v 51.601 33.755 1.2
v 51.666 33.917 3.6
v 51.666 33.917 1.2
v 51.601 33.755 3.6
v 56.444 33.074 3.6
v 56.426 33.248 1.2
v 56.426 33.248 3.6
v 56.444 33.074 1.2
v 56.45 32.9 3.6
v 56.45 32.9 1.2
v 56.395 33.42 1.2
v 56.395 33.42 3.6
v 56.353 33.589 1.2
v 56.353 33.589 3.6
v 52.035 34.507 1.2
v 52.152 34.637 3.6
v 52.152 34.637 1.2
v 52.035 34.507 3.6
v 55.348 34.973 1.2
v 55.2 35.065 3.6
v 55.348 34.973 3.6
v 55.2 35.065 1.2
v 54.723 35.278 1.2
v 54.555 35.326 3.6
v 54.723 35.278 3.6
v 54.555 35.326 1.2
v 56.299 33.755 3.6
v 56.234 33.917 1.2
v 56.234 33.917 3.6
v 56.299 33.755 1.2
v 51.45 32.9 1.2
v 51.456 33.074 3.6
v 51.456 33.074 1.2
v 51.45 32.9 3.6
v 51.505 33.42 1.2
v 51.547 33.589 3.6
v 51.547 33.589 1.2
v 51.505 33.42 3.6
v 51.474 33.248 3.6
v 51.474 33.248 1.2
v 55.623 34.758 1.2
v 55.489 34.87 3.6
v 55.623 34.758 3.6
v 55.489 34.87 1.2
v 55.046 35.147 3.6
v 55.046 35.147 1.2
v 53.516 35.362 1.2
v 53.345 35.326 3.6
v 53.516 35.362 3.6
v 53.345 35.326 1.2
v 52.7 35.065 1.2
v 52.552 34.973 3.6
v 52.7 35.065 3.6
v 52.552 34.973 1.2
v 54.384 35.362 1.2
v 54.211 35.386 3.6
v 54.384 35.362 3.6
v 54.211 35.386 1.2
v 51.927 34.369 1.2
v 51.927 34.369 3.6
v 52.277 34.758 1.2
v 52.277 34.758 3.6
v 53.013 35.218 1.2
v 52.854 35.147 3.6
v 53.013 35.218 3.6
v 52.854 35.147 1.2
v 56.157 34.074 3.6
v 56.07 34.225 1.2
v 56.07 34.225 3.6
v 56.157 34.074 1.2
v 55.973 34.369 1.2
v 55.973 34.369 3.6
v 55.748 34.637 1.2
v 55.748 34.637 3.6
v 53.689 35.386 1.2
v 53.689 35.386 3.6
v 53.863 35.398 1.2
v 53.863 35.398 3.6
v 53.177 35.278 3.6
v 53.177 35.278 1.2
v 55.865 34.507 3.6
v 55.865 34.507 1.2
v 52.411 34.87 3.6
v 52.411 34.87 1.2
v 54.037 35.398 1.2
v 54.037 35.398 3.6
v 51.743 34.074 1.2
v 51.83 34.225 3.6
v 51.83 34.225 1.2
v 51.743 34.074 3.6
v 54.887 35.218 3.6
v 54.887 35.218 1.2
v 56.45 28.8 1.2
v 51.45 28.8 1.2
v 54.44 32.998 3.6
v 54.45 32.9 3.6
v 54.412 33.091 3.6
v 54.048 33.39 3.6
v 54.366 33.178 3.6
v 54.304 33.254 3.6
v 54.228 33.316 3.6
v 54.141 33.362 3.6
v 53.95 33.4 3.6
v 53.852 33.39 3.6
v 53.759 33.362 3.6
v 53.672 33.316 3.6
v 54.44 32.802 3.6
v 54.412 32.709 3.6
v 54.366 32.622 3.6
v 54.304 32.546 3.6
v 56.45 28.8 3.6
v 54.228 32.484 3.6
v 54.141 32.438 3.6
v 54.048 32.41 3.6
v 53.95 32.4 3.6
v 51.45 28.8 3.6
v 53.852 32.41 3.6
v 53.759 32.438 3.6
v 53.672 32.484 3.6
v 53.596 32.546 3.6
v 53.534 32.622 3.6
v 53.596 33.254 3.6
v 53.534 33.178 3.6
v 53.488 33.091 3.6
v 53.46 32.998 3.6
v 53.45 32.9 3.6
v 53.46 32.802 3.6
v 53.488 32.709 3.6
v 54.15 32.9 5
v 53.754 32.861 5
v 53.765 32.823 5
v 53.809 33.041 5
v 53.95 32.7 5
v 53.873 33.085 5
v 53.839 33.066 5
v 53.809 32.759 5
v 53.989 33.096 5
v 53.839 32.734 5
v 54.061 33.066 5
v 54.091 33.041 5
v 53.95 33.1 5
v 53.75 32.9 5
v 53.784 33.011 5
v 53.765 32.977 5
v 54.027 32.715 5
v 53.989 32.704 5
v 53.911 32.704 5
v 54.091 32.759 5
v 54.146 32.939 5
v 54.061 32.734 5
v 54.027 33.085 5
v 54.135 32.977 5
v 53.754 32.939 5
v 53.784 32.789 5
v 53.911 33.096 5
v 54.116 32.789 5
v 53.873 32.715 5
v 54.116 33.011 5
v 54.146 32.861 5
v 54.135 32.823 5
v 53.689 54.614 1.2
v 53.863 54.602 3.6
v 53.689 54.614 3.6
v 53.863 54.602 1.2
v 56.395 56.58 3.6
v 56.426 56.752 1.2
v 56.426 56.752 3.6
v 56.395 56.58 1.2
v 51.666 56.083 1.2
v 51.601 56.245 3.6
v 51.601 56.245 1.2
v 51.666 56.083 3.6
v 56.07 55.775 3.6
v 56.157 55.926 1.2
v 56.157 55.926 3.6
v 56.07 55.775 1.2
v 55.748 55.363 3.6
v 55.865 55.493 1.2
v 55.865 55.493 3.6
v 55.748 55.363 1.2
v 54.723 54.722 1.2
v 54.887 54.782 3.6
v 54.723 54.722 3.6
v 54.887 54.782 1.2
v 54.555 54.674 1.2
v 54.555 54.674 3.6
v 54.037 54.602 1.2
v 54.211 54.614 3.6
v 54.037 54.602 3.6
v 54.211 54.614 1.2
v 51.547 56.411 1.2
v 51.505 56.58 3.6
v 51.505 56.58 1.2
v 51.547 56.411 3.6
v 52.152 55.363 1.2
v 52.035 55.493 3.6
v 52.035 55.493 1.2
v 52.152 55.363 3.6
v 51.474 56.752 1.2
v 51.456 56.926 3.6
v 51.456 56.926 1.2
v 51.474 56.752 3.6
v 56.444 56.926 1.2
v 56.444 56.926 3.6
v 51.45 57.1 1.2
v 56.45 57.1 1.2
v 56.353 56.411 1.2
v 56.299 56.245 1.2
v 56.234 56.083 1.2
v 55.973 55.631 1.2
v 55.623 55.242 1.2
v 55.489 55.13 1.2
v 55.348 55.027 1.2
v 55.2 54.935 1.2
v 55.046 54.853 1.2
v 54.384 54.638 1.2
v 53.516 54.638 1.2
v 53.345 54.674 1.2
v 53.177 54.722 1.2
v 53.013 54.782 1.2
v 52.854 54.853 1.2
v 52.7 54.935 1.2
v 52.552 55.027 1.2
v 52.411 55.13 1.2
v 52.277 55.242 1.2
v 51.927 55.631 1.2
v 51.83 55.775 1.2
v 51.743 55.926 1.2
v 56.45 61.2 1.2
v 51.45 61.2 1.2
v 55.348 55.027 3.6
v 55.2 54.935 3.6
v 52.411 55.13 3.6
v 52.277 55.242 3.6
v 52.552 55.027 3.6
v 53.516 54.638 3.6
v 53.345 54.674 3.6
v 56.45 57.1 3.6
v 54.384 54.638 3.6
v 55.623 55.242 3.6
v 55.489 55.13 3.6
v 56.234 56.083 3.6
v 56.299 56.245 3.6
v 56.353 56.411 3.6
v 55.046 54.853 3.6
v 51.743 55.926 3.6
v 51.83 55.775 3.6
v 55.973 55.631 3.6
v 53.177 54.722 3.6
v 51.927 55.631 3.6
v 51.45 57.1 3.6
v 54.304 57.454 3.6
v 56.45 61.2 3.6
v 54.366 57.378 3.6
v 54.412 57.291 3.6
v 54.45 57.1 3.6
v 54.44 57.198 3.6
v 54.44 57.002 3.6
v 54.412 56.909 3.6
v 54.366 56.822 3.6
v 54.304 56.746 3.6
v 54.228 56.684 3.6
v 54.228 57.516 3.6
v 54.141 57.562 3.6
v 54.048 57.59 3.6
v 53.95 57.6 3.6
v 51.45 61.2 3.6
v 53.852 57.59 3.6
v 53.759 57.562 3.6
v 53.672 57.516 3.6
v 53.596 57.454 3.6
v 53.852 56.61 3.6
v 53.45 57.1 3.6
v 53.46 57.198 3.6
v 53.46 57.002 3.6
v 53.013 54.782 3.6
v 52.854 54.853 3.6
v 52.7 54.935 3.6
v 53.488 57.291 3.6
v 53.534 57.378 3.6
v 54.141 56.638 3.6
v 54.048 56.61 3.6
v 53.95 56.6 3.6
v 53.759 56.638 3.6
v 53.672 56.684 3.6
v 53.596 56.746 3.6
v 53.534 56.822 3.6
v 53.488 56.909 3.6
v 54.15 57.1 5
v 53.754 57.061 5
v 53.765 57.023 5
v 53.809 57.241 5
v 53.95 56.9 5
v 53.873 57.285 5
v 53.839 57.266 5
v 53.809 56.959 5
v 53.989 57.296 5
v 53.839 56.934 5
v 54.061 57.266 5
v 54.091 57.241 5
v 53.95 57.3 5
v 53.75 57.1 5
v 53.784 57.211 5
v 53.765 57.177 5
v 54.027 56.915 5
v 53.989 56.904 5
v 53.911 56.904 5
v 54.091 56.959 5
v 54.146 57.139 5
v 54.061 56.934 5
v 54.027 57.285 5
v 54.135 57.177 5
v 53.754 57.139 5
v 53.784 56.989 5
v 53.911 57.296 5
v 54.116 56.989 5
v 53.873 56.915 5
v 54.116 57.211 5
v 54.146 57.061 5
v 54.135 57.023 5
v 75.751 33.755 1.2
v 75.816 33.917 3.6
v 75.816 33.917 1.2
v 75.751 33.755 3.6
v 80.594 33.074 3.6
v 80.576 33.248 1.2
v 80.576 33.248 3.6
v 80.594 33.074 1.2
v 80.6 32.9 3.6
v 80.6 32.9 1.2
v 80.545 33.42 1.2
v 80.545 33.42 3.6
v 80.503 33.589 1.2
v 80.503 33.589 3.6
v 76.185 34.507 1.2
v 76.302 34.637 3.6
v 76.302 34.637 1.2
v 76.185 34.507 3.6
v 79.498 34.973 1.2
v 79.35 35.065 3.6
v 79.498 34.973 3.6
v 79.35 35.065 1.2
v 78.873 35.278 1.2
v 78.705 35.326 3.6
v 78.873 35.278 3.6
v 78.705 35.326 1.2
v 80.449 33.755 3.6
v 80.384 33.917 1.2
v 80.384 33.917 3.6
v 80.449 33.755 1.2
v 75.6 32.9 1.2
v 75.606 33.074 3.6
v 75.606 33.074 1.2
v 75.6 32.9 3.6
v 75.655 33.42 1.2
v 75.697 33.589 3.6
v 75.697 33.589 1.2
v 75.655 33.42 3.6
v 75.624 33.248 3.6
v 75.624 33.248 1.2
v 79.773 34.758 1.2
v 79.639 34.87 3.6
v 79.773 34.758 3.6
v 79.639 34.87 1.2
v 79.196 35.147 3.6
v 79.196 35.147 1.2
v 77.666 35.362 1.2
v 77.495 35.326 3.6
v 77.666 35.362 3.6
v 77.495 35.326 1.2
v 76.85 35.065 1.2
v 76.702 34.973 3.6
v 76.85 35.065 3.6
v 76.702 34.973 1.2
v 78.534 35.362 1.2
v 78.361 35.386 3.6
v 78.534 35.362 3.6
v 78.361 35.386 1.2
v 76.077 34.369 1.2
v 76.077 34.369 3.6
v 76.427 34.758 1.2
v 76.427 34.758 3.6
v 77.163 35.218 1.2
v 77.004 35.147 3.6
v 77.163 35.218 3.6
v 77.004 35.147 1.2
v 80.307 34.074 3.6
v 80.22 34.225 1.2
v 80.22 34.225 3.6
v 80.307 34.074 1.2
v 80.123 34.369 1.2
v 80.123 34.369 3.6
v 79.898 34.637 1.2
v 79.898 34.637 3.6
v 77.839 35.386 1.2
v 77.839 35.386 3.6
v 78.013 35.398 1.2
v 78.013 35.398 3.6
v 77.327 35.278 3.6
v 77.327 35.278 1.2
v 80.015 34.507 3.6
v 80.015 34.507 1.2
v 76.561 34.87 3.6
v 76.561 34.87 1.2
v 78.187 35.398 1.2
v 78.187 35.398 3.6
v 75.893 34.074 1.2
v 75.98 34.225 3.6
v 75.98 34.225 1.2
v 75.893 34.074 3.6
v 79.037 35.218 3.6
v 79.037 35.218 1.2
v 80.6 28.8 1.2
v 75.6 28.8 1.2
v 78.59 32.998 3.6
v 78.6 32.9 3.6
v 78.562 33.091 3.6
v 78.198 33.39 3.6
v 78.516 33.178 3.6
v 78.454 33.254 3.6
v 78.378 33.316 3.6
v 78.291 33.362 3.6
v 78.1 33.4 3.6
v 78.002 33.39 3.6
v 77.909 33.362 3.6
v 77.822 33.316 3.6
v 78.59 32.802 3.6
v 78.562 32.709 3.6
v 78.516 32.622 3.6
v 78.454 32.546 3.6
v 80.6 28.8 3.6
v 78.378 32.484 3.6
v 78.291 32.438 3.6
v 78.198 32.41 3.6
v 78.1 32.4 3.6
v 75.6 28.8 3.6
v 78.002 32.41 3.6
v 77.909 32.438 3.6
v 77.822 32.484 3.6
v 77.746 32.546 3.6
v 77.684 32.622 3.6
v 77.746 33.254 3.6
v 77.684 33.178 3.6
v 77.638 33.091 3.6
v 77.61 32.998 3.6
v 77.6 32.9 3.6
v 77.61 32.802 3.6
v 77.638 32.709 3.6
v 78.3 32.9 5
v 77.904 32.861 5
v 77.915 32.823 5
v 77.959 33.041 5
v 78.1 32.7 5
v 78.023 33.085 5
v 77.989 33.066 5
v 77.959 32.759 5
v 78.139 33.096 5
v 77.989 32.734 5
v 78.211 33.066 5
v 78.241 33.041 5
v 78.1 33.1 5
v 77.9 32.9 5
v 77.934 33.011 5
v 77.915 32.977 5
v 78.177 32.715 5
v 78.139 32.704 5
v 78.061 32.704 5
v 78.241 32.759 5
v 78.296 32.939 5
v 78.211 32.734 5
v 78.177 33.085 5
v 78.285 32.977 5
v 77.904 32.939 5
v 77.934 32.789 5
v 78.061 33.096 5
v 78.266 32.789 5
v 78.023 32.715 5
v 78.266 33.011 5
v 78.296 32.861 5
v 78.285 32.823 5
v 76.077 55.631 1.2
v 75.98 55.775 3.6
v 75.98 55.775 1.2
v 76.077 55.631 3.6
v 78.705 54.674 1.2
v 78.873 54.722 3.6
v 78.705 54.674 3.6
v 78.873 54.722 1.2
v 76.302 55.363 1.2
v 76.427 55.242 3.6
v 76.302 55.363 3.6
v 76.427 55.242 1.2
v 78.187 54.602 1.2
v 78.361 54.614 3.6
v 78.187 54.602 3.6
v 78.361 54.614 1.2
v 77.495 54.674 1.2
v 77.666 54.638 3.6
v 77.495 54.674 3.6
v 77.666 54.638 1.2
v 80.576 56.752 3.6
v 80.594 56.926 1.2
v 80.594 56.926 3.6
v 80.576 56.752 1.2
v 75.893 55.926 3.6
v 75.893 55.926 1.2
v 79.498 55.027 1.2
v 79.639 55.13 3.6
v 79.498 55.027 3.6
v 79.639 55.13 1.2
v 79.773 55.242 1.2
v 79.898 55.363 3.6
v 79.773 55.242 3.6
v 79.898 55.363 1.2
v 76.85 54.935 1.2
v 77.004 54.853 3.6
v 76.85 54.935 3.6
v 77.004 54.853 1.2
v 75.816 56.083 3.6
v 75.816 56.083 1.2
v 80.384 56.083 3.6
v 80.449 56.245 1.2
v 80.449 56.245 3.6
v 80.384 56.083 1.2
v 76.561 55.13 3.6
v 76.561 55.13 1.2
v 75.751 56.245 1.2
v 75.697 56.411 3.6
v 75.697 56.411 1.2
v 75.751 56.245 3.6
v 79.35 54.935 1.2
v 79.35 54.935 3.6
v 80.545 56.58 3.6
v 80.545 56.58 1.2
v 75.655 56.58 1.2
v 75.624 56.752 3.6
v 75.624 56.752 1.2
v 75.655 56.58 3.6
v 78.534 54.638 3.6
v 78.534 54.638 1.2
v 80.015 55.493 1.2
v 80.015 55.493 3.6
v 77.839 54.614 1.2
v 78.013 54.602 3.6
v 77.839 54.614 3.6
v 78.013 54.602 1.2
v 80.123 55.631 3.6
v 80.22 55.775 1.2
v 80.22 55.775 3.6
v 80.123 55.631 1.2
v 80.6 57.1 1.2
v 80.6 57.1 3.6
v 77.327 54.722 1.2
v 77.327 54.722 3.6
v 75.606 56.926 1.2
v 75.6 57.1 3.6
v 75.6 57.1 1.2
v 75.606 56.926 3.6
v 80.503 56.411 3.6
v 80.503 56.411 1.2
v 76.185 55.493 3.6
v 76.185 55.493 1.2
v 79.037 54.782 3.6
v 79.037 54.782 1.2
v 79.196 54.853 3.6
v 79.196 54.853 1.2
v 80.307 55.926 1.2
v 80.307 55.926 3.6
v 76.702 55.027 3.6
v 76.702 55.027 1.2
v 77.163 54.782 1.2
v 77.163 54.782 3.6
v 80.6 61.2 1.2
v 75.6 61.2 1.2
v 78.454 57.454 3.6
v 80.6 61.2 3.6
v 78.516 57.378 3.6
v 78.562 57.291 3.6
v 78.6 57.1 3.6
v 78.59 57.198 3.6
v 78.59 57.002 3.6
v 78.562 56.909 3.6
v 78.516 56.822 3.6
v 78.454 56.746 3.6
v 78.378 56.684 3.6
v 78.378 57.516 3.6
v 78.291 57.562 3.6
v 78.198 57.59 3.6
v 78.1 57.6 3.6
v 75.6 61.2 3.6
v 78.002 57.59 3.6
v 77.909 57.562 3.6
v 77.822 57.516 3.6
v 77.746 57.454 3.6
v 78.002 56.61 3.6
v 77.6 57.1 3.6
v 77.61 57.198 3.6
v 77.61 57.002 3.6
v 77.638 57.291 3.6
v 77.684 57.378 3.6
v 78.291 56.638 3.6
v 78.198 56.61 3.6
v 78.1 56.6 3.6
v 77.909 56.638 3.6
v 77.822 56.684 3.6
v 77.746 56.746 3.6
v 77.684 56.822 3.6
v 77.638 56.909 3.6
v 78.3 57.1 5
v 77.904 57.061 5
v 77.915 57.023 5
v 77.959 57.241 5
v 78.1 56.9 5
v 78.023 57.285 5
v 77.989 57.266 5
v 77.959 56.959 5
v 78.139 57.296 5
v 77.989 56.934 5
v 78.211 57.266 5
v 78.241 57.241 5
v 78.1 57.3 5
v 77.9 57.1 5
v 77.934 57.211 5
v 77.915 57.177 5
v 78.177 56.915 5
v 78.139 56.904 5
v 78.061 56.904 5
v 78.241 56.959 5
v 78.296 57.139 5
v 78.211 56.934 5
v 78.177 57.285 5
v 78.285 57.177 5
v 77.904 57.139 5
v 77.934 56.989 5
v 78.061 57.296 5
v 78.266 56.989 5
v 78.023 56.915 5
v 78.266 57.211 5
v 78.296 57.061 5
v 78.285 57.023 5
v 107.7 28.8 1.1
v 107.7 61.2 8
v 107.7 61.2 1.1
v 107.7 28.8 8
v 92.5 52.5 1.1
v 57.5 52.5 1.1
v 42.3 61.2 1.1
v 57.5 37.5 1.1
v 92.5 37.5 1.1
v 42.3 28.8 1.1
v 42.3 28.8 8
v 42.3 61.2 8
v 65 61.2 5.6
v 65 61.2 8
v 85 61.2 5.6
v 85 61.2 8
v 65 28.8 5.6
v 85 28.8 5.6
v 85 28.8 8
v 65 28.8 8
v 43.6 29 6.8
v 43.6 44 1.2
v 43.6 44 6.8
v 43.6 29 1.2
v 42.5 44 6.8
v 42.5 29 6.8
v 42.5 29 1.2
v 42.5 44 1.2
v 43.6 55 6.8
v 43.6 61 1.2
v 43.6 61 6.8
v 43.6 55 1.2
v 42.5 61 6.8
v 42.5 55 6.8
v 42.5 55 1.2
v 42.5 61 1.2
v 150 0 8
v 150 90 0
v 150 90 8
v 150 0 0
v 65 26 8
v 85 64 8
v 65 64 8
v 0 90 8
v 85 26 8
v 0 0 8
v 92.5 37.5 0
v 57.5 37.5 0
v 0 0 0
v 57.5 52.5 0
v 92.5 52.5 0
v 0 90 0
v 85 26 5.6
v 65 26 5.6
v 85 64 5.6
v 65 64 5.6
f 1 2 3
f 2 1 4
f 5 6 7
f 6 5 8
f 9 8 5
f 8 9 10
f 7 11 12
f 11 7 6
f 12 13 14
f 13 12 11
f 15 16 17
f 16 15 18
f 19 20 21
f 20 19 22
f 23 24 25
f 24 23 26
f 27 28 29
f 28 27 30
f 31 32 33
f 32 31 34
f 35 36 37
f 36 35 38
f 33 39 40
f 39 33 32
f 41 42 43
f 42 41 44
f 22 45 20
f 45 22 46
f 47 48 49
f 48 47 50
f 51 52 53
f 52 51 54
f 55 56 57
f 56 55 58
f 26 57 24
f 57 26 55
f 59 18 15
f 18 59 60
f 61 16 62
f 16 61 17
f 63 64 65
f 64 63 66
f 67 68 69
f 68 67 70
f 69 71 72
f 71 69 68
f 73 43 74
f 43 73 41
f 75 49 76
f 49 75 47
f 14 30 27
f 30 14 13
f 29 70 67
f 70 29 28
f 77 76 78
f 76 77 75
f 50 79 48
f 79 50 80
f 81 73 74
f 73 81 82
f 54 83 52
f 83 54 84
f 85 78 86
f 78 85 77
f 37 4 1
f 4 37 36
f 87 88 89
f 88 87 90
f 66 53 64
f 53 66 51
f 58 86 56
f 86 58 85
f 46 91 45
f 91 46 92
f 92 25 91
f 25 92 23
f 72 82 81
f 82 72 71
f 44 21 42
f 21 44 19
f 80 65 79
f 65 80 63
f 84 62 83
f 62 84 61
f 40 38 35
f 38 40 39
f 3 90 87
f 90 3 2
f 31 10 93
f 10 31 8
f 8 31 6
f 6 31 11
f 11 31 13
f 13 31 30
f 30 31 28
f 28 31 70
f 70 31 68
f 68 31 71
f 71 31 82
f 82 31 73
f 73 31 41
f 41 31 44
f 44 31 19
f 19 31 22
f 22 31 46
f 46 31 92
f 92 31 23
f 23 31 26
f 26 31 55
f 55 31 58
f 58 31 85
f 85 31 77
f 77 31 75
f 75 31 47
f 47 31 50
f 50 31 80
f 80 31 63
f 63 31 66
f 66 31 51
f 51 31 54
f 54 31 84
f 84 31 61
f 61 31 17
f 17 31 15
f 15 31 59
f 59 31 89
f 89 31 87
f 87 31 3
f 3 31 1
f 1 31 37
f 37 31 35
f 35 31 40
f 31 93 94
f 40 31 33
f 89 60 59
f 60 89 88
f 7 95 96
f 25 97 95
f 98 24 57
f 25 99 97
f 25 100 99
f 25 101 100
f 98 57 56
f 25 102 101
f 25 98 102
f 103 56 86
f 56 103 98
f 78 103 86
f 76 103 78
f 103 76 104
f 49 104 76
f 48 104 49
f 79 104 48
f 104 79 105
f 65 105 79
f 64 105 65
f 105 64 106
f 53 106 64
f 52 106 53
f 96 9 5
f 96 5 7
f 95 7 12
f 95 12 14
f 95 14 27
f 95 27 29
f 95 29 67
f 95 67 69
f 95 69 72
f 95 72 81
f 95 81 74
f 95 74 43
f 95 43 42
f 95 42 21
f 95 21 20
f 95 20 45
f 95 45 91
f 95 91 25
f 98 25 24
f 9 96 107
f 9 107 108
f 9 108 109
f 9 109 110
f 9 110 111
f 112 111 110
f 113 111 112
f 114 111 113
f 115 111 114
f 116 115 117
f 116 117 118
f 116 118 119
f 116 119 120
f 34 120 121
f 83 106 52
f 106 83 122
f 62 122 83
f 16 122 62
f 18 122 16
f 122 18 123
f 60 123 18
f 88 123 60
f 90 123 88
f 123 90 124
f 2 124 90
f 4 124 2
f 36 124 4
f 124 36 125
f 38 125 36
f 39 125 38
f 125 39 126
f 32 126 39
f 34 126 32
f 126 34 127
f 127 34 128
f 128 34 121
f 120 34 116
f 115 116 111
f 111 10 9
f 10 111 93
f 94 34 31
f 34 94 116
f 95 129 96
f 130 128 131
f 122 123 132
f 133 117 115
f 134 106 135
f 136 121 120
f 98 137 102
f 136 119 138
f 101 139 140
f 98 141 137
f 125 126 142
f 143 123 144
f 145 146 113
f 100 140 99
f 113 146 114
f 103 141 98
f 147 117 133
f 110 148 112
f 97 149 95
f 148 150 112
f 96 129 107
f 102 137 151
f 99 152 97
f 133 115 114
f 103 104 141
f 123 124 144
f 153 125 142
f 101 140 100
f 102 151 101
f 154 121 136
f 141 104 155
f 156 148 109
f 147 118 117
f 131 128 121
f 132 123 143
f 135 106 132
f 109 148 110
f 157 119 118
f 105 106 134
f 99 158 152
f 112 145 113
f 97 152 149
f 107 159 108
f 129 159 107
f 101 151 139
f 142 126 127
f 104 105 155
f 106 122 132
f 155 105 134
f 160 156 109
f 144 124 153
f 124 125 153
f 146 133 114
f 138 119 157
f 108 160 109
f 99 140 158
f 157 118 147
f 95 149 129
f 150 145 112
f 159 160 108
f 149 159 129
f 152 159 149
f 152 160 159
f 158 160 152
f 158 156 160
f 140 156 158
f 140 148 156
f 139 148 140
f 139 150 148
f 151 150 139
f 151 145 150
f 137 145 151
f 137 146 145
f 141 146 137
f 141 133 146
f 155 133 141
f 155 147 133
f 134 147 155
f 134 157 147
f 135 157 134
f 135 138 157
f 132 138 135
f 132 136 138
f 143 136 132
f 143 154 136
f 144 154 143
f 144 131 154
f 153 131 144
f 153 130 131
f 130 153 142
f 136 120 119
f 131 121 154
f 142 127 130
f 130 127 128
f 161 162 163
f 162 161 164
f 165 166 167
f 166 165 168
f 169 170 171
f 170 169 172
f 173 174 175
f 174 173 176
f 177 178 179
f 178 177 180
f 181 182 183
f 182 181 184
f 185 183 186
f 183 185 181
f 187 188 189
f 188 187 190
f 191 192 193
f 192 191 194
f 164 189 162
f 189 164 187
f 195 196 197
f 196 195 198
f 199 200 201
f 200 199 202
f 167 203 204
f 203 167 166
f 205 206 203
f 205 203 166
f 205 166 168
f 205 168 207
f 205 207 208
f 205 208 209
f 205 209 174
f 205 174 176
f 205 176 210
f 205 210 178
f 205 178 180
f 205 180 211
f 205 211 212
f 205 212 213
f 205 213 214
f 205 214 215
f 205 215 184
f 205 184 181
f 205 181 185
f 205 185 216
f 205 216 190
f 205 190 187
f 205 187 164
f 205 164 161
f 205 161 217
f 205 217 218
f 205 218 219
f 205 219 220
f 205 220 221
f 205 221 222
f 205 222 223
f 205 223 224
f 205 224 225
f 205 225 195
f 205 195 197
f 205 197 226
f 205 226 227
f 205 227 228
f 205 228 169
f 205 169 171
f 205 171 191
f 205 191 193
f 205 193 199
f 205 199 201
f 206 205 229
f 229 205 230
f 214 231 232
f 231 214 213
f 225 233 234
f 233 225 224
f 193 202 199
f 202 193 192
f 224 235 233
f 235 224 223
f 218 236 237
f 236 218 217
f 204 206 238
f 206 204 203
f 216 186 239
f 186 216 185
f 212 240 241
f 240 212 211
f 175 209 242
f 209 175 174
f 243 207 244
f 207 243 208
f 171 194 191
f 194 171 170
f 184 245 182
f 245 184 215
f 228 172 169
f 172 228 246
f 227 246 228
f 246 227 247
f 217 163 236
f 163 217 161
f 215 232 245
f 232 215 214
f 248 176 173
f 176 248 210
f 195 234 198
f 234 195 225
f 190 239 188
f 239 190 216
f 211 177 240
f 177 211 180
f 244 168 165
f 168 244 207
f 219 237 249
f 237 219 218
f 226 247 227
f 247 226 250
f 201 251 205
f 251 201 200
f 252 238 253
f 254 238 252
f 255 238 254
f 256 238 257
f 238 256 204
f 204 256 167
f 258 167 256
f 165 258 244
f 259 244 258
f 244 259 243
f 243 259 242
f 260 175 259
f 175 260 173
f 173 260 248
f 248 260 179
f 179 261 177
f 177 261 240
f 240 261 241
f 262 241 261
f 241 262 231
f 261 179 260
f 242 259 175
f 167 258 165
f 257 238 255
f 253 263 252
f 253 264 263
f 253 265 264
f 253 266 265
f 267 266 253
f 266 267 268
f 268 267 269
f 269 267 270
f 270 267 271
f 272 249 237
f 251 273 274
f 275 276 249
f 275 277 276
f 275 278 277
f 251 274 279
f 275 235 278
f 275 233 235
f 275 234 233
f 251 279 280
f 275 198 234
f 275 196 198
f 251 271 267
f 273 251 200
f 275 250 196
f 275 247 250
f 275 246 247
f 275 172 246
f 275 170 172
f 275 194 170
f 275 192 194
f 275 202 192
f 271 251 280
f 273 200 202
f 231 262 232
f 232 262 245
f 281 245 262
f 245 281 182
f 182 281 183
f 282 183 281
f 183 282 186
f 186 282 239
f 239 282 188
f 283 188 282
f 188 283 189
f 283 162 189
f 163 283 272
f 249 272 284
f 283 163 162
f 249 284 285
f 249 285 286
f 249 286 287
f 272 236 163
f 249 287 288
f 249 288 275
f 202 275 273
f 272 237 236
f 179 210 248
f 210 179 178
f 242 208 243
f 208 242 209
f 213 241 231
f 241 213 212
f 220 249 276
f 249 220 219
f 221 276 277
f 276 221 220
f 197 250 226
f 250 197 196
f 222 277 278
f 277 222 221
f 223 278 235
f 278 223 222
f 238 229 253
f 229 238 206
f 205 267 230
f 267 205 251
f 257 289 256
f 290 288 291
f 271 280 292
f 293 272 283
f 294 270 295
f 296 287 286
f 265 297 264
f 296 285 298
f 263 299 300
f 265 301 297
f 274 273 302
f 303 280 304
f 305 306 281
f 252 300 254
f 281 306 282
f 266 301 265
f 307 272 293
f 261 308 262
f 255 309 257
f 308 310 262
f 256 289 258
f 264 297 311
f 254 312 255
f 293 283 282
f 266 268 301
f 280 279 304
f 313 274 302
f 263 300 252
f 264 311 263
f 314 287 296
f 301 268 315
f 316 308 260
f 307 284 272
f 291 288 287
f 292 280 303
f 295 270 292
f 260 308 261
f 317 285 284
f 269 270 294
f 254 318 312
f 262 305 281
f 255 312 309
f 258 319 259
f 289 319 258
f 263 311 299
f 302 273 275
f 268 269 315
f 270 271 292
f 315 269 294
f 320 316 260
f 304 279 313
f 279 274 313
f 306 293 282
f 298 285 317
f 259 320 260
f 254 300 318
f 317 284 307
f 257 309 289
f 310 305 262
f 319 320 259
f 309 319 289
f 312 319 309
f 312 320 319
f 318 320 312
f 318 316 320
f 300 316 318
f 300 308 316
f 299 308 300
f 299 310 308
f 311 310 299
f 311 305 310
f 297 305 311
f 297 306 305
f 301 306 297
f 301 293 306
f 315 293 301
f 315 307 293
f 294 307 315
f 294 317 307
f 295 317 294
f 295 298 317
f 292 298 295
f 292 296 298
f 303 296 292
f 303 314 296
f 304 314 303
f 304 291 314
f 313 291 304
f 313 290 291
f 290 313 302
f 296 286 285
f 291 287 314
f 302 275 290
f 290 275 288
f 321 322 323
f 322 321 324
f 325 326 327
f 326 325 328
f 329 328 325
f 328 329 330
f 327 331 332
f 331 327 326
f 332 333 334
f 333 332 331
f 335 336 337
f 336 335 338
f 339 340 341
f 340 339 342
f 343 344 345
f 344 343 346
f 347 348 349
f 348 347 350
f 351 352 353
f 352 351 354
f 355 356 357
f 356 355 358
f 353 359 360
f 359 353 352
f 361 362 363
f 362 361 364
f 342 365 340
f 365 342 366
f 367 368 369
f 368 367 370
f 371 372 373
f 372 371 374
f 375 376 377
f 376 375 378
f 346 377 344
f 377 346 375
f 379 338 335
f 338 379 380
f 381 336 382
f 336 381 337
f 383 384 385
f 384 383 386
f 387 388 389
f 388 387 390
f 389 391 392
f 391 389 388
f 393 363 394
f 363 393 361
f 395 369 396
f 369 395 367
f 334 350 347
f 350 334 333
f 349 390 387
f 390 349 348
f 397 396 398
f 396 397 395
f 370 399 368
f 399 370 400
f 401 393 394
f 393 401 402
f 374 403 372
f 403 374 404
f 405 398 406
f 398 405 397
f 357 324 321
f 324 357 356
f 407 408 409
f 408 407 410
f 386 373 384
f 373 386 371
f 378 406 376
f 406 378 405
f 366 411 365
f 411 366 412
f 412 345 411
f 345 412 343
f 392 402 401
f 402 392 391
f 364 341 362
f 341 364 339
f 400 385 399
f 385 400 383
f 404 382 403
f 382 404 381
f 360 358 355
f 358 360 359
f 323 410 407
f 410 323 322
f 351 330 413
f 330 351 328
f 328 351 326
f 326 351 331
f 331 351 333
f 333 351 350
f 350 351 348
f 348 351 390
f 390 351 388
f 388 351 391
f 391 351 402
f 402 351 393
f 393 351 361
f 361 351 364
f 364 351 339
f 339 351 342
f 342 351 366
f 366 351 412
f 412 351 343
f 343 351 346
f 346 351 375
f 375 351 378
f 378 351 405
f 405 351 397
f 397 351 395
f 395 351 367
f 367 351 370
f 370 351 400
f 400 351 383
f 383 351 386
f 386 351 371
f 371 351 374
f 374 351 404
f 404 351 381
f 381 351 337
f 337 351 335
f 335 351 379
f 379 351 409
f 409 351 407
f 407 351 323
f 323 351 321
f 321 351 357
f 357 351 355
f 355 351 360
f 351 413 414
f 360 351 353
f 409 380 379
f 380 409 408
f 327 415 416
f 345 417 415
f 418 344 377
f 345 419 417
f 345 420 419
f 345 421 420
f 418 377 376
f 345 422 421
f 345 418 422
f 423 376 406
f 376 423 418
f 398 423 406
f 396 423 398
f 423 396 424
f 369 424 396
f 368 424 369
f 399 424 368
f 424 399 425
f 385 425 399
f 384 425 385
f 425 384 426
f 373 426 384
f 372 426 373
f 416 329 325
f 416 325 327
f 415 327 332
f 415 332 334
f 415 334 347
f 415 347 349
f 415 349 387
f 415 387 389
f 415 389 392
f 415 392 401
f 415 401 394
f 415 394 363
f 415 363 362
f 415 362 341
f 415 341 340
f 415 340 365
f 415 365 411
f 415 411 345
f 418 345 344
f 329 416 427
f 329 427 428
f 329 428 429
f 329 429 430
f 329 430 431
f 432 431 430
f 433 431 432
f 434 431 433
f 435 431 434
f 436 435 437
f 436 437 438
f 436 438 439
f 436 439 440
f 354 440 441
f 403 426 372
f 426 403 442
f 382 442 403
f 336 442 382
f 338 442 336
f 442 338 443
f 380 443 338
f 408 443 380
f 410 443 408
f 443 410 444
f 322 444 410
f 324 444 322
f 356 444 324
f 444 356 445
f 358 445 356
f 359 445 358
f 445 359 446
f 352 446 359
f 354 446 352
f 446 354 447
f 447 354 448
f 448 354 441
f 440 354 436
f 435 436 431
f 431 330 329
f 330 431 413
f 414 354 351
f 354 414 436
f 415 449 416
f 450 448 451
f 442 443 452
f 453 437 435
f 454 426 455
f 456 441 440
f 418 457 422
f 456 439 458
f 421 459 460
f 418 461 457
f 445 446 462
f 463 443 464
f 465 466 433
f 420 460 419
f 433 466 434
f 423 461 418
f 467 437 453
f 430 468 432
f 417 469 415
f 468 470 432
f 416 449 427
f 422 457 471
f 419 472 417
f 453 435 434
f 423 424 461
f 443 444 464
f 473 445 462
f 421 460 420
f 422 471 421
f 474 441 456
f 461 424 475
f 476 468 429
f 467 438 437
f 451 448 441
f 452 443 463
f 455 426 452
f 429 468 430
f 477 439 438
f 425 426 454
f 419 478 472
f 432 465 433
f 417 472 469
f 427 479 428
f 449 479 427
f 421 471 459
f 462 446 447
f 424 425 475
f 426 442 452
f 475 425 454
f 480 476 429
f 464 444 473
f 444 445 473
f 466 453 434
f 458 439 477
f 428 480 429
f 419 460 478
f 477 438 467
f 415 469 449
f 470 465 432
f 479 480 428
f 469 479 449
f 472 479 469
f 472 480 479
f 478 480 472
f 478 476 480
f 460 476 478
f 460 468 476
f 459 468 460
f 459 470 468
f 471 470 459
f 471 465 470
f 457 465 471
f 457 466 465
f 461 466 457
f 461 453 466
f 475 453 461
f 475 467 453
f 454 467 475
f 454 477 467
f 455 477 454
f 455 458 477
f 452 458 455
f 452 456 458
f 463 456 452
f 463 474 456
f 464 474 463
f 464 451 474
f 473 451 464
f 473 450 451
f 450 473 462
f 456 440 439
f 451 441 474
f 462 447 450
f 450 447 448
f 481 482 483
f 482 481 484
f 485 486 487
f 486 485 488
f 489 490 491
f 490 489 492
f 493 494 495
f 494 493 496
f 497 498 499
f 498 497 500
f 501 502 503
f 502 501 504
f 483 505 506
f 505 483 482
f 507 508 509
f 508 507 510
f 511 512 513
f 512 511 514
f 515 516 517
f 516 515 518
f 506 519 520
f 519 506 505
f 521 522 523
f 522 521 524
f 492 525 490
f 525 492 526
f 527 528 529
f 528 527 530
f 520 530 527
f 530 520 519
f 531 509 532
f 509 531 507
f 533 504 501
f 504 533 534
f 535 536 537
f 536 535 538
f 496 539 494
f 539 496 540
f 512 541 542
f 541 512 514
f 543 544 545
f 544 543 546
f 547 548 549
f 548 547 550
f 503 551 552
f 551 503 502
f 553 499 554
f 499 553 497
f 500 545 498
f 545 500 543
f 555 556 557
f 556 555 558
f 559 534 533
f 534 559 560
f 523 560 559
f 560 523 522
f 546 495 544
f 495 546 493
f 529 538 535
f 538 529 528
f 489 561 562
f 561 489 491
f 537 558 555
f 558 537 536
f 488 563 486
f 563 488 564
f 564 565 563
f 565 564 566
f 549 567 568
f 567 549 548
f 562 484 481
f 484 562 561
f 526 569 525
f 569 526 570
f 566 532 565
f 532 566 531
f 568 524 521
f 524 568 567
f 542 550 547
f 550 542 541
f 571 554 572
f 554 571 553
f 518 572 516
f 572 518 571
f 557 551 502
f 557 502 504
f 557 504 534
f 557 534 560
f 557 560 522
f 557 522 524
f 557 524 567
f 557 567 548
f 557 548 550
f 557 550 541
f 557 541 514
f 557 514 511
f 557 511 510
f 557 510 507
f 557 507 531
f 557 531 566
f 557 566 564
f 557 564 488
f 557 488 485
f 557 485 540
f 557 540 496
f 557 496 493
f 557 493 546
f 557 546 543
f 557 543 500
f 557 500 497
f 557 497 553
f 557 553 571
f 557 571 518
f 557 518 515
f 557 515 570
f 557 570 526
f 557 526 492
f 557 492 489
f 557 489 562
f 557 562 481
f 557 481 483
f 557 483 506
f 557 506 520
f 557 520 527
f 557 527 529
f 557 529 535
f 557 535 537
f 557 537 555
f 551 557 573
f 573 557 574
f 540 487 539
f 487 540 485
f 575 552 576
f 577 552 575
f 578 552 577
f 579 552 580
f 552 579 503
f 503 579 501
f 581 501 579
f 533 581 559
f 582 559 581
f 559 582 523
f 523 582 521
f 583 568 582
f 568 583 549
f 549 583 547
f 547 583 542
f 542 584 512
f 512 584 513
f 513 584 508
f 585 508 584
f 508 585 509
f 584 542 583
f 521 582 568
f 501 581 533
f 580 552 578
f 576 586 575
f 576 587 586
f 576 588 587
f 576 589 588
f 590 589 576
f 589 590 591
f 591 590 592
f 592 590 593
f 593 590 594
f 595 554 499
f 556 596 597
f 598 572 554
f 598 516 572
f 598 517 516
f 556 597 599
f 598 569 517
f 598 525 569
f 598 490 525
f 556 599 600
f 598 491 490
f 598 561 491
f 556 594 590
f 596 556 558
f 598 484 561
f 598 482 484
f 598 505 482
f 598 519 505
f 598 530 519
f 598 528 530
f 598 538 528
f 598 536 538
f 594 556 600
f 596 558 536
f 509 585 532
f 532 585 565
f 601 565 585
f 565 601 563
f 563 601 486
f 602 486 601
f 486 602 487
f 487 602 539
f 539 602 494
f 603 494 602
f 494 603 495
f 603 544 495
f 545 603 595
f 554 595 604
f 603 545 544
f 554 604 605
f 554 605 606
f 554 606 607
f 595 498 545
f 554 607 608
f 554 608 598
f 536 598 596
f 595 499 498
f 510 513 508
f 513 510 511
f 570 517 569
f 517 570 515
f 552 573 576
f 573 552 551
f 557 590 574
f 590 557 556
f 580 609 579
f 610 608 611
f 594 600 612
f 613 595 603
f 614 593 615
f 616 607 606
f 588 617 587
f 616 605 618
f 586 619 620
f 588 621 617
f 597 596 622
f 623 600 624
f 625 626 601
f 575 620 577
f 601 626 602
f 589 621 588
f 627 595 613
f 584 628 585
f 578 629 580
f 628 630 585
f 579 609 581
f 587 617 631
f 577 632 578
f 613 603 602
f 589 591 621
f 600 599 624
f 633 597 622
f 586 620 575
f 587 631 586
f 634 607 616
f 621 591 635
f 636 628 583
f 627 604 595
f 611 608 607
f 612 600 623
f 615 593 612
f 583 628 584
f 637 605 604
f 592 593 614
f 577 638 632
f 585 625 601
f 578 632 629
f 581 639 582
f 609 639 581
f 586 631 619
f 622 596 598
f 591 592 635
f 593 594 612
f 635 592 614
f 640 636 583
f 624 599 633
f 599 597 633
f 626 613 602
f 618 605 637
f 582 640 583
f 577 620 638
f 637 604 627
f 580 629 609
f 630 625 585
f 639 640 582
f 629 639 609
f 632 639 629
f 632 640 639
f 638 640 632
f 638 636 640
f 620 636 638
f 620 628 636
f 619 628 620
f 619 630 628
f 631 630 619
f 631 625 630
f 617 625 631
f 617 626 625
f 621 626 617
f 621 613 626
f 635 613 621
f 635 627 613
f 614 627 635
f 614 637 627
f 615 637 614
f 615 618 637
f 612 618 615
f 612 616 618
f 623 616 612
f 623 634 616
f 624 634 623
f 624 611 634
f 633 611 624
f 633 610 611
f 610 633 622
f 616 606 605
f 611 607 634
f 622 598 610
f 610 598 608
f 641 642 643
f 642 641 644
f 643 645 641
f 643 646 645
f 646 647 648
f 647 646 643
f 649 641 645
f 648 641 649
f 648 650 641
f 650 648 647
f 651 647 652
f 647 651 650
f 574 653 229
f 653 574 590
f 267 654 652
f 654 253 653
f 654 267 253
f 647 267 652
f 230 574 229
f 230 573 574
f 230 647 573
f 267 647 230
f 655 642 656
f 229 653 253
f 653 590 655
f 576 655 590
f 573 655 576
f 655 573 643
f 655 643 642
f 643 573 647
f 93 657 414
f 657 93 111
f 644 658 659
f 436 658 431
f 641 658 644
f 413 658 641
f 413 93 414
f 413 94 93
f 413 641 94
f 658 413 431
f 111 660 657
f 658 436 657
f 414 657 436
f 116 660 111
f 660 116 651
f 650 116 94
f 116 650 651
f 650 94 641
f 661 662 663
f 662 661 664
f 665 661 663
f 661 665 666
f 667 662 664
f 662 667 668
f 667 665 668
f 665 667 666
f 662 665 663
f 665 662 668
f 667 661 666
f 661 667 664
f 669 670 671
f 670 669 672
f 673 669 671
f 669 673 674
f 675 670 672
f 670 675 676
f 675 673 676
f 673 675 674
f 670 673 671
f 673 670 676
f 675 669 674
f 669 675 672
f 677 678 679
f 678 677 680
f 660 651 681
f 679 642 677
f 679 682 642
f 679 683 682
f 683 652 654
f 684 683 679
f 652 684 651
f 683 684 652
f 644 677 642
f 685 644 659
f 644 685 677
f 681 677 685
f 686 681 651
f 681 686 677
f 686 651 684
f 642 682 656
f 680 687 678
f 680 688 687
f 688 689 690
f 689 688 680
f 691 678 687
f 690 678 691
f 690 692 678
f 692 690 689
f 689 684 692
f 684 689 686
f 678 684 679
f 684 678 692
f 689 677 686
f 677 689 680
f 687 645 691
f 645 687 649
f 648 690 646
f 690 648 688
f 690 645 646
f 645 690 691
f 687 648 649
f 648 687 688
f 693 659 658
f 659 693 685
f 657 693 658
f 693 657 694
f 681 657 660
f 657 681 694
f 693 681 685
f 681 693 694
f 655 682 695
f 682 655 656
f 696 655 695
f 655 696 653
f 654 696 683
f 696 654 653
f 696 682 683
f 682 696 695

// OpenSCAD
$fs=0.1; 
$fa=4;

difference() {
    cube([150, 90, 5.6 + 1.2 + 1.2]);
    translate([150/2 - 65/2, 90/2 - 32/2, 1.2]) {
        difference() {
            translate([-0.2, -0.2, -0.1])
                cube([65.4, 32.4, 5.6 + 1.2 + 0.2]);

            translate([11.45, 3.9, 0]) {
                cylinder(h=2.4, r=2.5);
                translate([-2.5, -5, 0])
                    cube([5, 5, 2.4]);
                translate([0,0,2.4])
                    cylinder(h=1.4, r1=0.5, r2=0.2);
            }
            
            translate([11.45, 28.10, 0]) {
                cylinder(h=2.4, r=2.5);
                translate([-2.5, 0, 0])
                    cube([5, 5, 2.4]);
                translate([0,0,2.4])
                    cylinder(h=1.4, r1=0.5, r2=0.2);
            }
            
            translate([35.6, 3.9, 0]) {
                cylinder(h=2.4, r=2.5);
                translate([-2.5, -5, 0])
                    cube([5, 5, 2.4]);
                translate([0,0,2.4])
                    cylinder(h=1.4, r1=0.5, r2=0.2);
            }
            
            translate([35.6, 28.10, 0]) {
                cylinder(h=2.4, r=2.5);
                translate([-2.5, 0, 0])
                    cube([5, 5, 2.4]);
                translate([0,0,2.4])
                    cylinder(h=1.4, r1=0.5, r2=0.2);
            }
            
            translate([0, 0, 0])
                cube([1.1, 15, 5.6]);
            
            translate([0, 32 - 6, 0])
                cube([1.1, 6, 5.6]);
        }
    }
    
    translate([150/2 - 35/2, 90/2 - 15/2, -1]) {
        cube([35, 15, 5.6 + 1.2 + 0.2]);
    }
    
    translate([150/2 - 10, 90/2 - 32/2 - 3, 5.6]) {
        cube([20, 3, 10]);
    }
    
    translate([150/2 - 10, 90/2 + 32/2, 5.6]) {
        cube([20, 3, 10]);
    }
};
